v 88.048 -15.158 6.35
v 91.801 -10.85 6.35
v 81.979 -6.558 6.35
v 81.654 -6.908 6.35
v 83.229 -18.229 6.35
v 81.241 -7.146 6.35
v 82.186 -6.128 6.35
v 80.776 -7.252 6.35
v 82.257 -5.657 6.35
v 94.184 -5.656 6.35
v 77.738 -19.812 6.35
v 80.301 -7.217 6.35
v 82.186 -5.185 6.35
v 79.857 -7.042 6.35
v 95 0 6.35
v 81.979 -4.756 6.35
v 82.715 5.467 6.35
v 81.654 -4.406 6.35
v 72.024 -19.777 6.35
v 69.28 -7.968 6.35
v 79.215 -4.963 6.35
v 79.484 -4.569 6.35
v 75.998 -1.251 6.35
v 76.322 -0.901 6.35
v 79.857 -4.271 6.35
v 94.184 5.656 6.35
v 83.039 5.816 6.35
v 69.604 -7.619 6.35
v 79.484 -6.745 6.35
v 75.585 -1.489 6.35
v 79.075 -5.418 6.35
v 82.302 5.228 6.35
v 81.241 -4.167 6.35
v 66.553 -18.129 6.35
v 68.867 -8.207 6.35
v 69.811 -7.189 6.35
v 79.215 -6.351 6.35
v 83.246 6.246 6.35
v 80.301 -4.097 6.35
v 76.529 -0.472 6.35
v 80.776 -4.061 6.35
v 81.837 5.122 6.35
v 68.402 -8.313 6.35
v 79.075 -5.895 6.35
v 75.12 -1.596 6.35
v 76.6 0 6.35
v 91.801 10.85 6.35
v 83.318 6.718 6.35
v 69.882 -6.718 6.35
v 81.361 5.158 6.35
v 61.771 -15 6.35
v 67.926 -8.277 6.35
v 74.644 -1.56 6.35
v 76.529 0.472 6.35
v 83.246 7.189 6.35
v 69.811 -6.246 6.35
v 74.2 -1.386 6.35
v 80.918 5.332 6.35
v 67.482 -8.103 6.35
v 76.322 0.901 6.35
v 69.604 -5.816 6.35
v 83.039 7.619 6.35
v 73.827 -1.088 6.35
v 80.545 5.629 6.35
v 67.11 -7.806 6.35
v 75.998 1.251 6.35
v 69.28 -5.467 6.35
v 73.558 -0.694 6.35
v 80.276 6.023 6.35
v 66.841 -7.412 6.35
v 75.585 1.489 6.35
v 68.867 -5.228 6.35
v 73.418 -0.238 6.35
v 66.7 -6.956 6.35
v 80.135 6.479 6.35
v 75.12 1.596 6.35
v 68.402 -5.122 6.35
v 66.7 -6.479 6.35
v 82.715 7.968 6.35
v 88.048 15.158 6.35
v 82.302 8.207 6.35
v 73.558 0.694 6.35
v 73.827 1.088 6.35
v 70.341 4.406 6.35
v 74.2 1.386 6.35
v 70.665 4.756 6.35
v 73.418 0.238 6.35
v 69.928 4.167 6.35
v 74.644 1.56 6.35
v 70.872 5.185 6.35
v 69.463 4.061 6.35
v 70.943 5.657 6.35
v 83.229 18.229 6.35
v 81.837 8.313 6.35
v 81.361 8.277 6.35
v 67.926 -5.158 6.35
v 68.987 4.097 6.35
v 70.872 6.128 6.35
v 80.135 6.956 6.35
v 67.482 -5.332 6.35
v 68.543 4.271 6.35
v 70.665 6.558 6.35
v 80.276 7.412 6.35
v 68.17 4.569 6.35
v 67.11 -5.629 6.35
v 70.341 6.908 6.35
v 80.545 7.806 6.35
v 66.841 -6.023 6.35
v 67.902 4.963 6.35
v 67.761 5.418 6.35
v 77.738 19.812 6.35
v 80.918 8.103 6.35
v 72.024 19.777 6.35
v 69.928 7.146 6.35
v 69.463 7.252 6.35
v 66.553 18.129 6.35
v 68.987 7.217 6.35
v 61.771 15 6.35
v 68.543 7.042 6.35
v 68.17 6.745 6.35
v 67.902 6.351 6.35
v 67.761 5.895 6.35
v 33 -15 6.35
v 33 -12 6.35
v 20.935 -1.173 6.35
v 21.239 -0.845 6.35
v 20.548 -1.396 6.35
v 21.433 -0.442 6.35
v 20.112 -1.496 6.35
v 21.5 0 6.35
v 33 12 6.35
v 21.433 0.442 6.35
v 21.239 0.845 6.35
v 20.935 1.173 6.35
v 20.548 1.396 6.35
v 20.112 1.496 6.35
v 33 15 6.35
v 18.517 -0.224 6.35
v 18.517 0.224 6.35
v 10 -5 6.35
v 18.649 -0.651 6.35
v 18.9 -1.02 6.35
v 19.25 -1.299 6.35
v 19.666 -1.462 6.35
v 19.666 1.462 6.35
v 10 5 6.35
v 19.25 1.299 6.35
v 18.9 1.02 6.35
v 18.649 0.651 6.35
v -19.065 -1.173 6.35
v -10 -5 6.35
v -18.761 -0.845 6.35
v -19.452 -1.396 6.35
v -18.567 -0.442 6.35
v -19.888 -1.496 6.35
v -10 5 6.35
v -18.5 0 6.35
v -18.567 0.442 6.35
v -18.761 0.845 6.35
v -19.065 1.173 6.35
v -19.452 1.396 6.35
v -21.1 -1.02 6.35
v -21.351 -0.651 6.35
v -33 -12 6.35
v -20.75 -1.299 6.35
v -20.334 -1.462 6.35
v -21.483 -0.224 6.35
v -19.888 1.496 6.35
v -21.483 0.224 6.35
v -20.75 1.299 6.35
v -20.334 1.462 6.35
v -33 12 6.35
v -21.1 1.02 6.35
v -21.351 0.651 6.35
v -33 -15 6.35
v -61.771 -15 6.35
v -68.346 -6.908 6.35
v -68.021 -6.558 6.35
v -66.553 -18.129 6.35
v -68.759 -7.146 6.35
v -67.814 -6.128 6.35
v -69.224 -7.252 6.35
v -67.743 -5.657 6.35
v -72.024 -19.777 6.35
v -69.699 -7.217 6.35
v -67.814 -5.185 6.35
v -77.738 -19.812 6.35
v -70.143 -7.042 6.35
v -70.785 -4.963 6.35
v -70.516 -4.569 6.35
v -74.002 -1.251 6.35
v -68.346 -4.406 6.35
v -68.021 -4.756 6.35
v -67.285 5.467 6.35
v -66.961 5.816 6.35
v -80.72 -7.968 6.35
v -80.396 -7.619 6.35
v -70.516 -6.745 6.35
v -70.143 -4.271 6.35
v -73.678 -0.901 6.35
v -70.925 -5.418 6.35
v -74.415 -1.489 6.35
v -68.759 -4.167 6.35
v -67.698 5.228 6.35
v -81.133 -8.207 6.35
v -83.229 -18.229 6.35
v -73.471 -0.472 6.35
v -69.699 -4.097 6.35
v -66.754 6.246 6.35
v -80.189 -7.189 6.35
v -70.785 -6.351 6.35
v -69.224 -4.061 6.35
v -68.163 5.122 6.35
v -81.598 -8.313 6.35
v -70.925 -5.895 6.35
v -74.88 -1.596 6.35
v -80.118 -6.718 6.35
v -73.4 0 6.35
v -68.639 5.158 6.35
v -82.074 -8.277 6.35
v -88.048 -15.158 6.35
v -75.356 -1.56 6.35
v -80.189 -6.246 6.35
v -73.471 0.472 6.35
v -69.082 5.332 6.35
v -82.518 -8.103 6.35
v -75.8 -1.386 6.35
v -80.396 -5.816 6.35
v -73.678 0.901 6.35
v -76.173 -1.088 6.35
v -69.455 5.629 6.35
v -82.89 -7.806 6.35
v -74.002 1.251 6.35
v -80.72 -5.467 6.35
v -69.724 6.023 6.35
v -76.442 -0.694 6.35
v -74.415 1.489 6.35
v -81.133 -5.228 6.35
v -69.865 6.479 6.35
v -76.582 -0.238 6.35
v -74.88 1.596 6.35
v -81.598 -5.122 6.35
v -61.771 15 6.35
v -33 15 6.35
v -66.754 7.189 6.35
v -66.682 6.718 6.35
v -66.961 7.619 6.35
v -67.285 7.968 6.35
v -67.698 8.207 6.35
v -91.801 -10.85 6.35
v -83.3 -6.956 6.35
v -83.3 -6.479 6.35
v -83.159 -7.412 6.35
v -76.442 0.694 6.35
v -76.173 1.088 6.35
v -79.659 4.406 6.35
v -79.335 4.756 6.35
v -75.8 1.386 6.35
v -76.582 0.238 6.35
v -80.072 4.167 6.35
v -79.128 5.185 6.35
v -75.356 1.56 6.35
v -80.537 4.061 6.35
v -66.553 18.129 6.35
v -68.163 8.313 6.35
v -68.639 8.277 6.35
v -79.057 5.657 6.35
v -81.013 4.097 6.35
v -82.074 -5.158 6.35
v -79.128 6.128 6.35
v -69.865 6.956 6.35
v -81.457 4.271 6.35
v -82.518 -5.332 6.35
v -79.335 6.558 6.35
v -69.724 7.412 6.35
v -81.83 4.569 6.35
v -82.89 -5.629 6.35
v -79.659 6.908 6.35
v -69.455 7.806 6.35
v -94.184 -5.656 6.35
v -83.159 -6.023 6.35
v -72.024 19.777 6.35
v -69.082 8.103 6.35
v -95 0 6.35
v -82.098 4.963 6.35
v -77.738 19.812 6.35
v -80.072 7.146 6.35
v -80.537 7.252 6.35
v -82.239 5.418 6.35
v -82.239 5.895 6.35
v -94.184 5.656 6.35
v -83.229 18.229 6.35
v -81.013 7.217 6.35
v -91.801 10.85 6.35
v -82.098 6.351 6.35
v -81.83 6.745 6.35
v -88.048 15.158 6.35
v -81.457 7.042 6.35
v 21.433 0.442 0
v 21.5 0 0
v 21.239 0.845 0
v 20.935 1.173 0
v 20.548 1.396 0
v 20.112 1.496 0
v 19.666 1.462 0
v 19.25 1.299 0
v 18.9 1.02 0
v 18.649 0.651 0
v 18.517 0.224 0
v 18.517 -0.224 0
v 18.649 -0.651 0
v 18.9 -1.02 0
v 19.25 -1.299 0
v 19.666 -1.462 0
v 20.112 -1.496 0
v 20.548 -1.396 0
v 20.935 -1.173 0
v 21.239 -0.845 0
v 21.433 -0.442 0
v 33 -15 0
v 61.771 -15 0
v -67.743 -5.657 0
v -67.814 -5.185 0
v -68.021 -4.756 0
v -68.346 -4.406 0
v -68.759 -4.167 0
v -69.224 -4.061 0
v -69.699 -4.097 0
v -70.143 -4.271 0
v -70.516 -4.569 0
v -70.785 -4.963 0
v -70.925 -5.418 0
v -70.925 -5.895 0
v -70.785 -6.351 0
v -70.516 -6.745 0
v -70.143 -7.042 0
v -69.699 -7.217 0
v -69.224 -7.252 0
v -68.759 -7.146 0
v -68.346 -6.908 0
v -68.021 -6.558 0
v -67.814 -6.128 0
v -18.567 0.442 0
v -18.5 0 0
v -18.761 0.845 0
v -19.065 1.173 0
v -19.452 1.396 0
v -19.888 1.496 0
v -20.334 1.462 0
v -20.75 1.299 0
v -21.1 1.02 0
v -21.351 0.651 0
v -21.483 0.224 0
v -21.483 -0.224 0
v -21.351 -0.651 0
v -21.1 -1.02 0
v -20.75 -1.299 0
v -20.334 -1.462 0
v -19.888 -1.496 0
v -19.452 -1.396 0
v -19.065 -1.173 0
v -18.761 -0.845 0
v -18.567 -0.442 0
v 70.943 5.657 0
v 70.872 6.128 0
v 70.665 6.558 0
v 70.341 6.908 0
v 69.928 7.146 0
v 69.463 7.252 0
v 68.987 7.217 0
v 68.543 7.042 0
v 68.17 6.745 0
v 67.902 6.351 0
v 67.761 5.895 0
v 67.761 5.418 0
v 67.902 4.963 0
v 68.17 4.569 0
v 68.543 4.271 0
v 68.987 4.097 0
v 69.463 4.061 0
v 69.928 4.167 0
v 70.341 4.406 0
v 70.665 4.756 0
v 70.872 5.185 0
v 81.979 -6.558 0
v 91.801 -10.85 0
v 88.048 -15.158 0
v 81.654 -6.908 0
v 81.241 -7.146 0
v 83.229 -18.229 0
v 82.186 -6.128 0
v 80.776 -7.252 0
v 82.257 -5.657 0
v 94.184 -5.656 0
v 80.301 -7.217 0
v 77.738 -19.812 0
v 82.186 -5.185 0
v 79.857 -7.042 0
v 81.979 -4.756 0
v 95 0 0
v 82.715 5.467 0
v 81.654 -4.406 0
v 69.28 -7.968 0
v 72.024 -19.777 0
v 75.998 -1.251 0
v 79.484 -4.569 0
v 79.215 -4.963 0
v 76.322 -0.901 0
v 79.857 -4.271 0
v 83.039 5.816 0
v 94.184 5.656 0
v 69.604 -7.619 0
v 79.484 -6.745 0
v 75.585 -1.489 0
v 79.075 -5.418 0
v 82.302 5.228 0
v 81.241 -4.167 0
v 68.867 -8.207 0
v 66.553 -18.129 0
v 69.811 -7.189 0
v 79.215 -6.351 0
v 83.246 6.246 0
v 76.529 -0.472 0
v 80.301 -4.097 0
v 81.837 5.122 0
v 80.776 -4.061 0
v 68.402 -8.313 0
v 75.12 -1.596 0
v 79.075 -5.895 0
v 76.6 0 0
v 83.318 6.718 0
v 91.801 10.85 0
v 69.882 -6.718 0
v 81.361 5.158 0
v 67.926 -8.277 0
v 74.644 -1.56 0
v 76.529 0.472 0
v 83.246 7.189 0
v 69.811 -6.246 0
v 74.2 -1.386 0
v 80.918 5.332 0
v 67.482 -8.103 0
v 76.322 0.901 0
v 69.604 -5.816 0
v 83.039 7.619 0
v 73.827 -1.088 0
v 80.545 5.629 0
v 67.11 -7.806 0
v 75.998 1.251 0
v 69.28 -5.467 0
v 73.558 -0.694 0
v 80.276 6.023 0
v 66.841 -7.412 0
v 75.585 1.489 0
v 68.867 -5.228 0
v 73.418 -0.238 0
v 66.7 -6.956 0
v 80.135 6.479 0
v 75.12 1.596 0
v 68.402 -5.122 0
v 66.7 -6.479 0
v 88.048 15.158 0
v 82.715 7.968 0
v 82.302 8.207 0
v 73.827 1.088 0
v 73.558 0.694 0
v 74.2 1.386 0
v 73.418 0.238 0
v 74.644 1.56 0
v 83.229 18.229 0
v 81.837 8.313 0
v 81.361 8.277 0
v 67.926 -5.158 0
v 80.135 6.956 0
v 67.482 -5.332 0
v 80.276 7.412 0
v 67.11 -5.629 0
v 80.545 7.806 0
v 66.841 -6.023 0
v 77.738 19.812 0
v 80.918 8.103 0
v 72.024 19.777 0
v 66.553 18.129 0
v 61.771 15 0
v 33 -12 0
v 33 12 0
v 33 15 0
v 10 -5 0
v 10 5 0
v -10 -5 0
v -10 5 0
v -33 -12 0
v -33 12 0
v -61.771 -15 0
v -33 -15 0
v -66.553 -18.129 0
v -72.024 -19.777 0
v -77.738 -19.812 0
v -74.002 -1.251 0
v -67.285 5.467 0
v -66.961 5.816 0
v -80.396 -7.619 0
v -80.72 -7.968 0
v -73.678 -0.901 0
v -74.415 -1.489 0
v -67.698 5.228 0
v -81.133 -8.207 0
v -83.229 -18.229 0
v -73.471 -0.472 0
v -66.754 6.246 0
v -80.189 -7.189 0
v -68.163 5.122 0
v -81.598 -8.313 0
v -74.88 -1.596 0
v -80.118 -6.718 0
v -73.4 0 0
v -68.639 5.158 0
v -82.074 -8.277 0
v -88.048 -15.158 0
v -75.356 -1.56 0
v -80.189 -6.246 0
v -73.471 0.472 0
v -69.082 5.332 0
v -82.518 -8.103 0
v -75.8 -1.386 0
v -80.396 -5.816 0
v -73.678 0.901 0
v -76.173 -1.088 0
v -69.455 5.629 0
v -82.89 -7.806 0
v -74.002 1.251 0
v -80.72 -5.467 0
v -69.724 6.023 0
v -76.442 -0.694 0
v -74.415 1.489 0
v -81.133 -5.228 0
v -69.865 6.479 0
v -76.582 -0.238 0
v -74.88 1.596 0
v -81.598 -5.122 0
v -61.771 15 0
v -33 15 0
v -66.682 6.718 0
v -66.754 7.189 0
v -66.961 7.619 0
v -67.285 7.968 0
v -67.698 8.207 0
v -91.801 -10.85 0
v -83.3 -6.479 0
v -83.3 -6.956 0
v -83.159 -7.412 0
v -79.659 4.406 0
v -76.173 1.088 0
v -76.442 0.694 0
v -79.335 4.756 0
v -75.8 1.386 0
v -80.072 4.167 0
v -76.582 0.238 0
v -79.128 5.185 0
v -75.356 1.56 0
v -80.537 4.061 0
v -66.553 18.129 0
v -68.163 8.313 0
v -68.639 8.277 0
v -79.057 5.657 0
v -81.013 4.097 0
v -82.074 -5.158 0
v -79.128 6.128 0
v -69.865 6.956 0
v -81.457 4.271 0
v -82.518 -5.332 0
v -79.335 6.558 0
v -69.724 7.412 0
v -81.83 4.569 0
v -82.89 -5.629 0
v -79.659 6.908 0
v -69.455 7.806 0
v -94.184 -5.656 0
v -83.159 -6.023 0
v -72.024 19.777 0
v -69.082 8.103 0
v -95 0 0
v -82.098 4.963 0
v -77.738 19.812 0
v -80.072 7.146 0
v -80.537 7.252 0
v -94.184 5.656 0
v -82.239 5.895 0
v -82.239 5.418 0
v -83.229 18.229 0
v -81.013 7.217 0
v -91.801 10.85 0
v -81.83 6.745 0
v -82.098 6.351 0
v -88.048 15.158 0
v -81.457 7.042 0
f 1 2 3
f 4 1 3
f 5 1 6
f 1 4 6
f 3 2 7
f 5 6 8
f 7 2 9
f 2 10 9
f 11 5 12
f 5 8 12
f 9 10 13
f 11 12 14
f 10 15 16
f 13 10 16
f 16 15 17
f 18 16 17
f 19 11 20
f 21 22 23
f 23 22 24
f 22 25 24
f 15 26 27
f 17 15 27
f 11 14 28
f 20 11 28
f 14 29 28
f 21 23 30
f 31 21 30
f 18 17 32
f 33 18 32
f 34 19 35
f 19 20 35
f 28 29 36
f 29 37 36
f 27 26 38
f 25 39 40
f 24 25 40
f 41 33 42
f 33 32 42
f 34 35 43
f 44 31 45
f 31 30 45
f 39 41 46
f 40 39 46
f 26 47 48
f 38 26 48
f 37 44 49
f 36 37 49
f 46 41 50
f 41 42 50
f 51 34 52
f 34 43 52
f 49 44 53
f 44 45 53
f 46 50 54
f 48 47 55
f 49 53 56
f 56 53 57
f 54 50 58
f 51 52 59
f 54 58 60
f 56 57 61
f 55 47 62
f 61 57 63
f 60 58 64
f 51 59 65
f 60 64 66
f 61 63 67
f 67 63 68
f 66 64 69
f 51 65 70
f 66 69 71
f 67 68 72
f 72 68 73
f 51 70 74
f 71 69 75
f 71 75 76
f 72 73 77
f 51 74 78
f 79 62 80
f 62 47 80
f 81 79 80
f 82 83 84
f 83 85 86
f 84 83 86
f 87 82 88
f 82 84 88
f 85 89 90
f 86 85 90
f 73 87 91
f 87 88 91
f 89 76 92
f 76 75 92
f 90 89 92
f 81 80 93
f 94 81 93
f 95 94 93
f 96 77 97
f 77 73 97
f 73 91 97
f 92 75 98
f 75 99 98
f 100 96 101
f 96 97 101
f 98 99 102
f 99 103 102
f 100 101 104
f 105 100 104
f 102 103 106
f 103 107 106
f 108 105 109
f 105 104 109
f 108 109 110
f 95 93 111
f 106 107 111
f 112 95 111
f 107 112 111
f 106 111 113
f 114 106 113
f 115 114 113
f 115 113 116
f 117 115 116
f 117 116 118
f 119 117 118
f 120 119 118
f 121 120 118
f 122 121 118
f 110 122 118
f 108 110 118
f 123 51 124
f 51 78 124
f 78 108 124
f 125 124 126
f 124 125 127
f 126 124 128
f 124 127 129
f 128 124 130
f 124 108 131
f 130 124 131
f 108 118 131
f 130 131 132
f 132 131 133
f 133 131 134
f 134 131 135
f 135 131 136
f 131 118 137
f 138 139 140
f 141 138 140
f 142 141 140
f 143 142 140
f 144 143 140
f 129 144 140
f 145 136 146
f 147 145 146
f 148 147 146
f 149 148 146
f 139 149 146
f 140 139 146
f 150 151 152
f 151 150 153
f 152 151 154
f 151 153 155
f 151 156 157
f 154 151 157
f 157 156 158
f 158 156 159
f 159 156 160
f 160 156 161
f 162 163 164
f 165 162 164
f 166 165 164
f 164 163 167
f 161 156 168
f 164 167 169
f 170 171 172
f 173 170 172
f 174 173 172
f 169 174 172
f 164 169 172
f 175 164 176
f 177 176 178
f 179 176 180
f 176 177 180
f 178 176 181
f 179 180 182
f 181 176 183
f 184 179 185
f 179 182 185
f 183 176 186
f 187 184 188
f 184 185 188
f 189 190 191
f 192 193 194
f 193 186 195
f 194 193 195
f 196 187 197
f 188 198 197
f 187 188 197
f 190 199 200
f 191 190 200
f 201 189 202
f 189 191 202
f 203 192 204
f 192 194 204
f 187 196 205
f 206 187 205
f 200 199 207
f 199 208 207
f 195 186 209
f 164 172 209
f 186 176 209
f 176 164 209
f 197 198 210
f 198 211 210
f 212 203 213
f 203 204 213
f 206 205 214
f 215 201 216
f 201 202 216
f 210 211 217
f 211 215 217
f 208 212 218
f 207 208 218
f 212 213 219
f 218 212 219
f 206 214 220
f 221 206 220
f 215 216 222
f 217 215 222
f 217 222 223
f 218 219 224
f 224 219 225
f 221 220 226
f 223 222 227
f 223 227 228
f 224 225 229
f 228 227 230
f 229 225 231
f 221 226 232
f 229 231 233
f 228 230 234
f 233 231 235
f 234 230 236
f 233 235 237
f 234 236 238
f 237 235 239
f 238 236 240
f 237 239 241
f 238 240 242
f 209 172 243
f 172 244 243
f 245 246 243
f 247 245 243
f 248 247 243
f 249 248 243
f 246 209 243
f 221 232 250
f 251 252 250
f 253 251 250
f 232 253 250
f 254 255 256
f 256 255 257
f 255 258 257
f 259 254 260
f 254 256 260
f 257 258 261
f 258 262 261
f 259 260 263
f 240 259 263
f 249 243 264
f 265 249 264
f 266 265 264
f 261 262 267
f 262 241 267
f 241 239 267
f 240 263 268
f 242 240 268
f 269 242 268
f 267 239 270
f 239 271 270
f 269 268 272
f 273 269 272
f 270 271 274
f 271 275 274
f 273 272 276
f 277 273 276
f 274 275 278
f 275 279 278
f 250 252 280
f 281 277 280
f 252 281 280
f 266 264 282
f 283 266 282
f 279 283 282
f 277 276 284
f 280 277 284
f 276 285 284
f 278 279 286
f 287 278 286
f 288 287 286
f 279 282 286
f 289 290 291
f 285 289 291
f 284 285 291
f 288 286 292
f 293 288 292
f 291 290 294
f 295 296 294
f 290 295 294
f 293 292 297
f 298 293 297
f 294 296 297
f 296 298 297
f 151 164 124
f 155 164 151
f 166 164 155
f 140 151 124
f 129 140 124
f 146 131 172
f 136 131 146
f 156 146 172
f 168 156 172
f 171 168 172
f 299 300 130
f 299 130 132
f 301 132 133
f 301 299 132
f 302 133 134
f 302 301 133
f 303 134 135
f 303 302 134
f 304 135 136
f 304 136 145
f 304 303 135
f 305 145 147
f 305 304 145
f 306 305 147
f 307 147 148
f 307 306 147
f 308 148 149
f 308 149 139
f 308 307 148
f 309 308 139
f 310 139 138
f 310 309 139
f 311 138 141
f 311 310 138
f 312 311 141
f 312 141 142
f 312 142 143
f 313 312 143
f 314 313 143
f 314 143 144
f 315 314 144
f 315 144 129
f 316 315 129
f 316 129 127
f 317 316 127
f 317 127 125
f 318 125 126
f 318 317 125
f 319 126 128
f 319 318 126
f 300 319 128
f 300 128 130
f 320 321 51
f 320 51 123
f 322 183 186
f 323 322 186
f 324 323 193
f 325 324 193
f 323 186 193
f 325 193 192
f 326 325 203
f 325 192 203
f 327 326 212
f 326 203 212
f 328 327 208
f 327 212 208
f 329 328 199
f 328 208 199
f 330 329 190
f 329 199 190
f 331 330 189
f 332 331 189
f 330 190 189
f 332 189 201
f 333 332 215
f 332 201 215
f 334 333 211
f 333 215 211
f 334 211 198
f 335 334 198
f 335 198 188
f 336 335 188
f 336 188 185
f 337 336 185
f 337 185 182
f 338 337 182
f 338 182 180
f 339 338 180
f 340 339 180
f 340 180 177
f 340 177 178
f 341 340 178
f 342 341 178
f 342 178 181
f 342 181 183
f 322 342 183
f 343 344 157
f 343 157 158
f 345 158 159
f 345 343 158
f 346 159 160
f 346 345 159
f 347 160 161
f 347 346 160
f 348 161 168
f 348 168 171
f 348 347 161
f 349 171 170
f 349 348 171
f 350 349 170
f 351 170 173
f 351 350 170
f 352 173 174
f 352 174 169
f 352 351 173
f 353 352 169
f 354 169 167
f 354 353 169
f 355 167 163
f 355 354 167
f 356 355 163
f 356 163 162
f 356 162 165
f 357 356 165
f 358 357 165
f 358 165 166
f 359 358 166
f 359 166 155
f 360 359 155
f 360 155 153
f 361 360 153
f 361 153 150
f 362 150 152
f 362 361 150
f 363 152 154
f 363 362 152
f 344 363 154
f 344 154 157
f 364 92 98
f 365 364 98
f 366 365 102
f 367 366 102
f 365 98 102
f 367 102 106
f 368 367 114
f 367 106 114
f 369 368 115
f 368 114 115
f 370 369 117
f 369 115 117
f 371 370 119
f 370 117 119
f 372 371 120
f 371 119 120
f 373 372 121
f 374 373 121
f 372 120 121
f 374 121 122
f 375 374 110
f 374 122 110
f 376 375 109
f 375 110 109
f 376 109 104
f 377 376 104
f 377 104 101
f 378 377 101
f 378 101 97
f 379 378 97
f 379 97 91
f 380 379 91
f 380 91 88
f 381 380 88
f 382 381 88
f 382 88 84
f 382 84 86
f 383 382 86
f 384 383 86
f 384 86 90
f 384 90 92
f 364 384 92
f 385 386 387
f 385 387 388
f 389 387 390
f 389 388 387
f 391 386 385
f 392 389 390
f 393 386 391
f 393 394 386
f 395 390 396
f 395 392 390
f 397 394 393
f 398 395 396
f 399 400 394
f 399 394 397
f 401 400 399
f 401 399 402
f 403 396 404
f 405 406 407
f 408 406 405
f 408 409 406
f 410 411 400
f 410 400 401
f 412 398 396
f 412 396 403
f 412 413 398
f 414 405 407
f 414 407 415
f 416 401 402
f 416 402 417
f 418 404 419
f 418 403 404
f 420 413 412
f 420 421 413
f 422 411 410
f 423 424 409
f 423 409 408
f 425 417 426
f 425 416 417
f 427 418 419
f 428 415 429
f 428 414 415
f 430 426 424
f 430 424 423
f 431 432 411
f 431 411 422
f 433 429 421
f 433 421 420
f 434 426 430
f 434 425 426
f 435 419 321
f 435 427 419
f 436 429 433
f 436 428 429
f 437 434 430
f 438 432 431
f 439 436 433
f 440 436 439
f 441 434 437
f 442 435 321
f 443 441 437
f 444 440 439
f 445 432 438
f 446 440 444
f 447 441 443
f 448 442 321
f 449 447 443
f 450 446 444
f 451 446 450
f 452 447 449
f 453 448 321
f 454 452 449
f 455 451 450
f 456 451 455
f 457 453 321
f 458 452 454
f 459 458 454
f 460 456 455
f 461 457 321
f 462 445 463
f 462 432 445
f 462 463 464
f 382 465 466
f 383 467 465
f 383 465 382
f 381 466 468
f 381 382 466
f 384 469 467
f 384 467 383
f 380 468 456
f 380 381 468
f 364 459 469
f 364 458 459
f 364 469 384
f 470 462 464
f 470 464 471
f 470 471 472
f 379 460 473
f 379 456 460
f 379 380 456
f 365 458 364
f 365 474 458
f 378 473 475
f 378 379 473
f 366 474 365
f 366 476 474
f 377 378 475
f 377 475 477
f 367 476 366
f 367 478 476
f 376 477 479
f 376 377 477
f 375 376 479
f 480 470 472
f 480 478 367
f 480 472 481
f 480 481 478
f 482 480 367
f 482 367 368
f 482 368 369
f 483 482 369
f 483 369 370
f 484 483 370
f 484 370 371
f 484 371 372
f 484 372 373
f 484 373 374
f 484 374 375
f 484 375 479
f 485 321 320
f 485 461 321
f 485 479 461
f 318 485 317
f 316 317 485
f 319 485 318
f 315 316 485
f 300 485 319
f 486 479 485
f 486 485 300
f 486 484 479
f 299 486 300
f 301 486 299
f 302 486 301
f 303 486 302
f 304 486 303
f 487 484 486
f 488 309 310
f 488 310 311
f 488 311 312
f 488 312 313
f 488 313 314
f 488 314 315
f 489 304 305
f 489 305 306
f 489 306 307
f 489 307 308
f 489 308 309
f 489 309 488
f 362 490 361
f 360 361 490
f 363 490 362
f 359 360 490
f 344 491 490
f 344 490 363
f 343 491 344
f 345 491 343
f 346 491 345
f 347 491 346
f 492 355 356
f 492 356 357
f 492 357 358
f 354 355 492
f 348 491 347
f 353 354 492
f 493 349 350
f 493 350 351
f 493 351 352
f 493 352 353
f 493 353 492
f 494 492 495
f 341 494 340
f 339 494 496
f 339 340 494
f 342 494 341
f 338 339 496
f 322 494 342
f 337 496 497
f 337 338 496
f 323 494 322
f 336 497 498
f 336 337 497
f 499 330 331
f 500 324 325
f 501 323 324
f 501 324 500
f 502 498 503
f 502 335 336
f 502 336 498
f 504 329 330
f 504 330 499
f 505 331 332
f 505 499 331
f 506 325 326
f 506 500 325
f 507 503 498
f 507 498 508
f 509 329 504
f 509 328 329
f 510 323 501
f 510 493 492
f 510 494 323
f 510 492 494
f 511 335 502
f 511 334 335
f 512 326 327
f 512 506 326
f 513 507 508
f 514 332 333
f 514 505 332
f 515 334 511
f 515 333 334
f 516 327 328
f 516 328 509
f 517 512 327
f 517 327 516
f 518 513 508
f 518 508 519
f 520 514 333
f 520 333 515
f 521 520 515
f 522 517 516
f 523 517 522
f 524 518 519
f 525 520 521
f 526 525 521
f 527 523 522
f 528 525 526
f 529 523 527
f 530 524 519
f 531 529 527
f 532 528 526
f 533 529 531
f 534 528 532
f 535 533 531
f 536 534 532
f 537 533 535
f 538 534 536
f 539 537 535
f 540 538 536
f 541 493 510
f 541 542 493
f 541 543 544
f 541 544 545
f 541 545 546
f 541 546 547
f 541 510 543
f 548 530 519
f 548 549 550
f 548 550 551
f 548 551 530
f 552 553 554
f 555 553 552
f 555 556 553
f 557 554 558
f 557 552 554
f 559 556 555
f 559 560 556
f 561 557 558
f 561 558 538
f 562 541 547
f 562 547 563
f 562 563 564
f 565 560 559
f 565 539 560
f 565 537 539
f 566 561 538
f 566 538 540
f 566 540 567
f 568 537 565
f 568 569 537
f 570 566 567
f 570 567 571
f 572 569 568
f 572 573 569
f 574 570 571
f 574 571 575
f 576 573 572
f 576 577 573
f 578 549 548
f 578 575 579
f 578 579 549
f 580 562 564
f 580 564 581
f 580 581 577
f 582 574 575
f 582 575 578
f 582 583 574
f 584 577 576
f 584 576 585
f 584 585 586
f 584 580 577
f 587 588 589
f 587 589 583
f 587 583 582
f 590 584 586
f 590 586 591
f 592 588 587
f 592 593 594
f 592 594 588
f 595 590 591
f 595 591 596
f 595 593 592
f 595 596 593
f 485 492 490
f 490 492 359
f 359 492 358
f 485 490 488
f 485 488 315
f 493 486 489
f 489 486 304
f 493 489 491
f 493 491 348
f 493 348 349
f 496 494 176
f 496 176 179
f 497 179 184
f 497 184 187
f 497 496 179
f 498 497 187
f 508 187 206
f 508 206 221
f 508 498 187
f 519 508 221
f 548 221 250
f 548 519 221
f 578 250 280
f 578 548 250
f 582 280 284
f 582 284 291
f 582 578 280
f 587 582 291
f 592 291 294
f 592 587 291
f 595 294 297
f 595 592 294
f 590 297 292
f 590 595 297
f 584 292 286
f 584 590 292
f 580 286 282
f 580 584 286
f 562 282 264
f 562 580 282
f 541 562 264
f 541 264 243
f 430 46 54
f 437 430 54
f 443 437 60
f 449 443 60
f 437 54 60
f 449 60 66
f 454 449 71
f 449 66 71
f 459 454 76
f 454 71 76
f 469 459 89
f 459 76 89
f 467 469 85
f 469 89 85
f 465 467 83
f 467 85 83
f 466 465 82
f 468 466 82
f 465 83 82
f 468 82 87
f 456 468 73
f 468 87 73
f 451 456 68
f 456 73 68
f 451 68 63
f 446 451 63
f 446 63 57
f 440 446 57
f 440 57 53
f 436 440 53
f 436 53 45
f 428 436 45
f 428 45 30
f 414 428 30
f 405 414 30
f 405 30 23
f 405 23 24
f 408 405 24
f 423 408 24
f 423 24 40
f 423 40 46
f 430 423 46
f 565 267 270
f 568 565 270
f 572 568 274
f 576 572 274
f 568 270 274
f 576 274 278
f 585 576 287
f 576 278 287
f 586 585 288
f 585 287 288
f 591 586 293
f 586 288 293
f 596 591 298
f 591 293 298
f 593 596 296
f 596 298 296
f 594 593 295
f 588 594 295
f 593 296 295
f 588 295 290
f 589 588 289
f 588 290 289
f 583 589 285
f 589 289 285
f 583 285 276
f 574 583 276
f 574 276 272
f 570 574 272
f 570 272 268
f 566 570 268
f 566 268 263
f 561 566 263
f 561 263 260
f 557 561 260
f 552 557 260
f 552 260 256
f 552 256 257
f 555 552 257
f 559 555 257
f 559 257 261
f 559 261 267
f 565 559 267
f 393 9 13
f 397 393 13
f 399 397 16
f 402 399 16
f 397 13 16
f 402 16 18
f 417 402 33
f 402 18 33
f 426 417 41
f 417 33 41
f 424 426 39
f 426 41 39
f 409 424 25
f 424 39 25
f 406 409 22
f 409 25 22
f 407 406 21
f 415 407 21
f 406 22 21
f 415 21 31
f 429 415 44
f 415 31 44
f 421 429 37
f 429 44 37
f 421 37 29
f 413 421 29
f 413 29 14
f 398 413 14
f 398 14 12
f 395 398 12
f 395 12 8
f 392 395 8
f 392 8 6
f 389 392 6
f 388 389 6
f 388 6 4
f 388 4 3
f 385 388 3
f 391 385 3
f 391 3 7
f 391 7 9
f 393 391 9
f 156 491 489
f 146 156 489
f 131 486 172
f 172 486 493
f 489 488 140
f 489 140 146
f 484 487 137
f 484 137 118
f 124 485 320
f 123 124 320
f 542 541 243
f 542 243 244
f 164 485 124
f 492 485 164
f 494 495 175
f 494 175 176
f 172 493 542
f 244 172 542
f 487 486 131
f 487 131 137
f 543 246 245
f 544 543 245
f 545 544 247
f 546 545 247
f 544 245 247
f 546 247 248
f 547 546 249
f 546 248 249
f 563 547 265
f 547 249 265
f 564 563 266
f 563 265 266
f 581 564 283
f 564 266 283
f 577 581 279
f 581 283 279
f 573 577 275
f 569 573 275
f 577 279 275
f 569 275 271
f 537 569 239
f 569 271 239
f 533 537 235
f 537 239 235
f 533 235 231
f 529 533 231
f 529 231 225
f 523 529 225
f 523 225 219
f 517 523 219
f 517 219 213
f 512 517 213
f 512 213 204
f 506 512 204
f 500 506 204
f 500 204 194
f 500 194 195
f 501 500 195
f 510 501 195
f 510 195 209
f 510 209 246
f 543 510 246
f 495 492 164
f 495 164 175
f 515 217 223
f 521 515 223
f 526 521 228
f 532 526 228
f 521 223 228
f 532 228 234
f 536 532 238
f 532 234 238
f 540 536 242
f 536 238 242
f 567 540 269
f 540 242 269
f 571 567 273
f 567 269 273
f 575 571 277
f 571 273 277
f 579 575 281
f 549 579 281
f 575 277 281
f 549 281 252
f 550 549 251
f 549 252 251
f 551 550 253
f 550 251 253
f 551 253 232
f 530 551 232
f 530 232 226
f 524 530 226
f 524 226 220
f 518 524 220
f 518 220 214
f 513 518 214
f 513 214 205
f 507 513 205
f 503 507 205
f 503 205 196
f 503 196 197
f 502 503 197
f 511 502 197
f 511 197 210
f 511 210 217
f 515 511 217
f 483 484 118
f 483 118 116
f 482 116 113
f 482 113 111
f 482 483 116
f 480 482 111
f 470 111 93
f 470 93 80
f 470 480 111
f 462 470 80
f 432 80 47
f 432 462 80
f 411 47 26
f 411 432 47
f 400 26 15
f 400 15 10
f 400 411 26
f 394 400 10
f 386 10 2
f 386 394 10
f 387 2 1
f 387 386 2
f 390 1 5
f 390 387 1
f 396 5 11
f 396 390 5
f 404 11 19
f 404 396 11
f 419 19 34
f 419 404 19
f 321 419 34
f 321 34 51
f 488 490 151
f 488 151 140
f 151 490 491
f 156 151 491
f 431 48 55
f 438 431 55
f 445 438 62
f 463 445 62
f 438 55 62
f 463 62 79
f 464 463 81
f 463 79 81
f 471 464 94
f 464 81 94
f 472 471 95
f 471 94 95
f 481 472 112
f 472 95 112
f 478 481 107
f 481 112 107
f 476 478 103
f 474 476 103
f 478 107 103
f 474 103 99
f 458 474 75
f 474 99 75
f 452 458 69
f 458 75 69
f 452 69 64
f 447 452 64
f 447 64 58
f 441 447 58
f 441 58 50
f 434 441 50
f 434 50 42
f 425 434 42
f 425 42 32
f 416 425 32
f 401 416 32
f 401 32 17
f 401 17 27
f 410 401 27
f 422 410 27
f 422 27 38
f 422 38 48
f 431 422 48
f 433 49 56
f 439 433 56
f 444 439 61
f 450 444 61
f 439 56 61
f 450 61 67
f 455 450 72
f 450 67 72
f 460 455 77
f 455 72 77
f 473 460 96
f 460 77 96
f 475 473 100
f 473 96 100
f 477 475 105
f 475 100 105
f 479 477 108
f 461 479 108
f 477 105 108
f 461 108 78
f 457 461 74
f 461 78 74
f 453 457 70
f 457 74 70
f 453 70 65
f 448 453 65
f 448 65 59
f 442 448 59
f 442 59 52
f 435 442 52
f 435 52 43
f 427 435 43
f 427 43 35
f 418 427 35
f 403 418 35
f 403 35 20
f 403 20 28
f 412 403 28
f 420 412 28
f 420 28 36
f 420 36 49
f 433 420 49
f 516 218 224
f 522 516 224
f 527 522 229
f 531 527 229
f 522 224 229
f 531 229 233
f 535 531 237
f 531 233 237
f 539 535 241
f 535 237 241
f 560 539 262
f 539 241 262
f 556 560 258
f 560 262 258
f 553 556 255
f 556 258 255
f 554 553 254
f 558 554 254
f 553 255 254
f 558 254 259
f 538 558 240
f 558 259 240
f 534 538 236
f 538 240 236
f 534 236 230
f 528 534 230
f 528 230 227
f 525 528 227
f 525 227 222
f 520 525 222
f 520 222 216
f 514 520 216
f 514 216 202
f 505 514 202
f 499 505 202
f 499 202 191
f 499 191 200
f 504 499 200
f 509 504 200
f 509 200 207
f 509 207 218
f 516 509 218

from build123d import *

# Parameters (mm, degrees)
SKETCH3_R                = 1.5
SKETCH3_W                = 20
SKETCH3_H                = 10
BOSS_EXTRUDE1_DEPTH      = 6.35
M3_CLEARANCE_HOLE1_D     = 3.2
M3_CLEARANCE_HOLE1_DEPTH = 7.5
M3_CLEARANCE_HOLE1_TIP   = 0.96137699
SKETCH4_W                = 66
SKETCH4_H                = 3
CUT_EXTRUDE1_DEPTH       = 10


with BuildPart() as part:
    # Sketch3 → Boss-Extrude1 (new body)
    with BuildSketch(Plane.XY):
        with BuildLine():
            Line((61.771243445, -15), (-61.771243445, -15))
            ThreePointArc((-61.771243445, -15), (-95, 0), (-61.771243445, 15))
            Line((-61.771243445, 15), (61.771243445, 15))
            ThreePointArc((61.771243445, 15), (95, 0), (61.771243445, -15))
        make_face()
        with Locations((-20, 0)):
            Circle(SKETCH3_R, mode=Mode.SUBTRACT)
        with Locations((20, 0)):
            Circle(SKETCH3_R, mode=Mode.SUBTRACT)
        Rectangle(SKETCH3_W, SKETCH3_H, mode=Mode.SUBTRACT)
    extrude(amount=BOSS_EXTRUDE1_DEPTH)

    # M3 Clearance Hole1
    with Locations(Plane(origin=(0, 0, 0), x_dir=(-1, 0, 0), z_dir=(0, 0, -1))):
        with Locations((81.717514421, -6.717514421), (75, 0), (0, 0), (-75, 0), (-69.343145751, 5.656854249), (-80.656854249, -5.656854249), (-81.717514421, 6.717514421), (-68.282485579, -6.717514421), (68.282485579, 6.717514421), (80.656854249, 5.656854249), (69.343145751, -5.656854249)):
            Hole(M3_CLEARANCE_HOLE1_D / 2, depth=M3_CLEARANCE_HOLE1_DEPTH)
            with Locations((0, 0, -(M3_CLEARANCE_HOLE1_DEPTH + M3_CLEARANCE_HOLE1_TIP / 2))):  # 118° drill point
                Cone(0, M3_CLEARANCE_HOLE1_D / 2, M3_CLEARANCE_HOLE1_TIP, mode=Mode.SUBTRACT)

    # Sketch4 → Cut-Extrude1 (cut)
    with BuildSketch(Plane(origin=(0, 0, 0), x_dir=(-1, 0, 0), z_dir=(0, 0, -1))):
        with Locations((0, 13.5)):
            Rectangle(SKETCH4_W, SKETCH4_H)
    cut_extrude1 = extrude(amount=-CUT_EXTRUDE1_DEPTH, mode=Mode.SUBTRACT)

    # Mirror1: Cut-Extrude1 across plane
    add(cut_extrude1.mirror(Plane.ZX), mode=Mode.SUBTRACT)


solid = part.part
